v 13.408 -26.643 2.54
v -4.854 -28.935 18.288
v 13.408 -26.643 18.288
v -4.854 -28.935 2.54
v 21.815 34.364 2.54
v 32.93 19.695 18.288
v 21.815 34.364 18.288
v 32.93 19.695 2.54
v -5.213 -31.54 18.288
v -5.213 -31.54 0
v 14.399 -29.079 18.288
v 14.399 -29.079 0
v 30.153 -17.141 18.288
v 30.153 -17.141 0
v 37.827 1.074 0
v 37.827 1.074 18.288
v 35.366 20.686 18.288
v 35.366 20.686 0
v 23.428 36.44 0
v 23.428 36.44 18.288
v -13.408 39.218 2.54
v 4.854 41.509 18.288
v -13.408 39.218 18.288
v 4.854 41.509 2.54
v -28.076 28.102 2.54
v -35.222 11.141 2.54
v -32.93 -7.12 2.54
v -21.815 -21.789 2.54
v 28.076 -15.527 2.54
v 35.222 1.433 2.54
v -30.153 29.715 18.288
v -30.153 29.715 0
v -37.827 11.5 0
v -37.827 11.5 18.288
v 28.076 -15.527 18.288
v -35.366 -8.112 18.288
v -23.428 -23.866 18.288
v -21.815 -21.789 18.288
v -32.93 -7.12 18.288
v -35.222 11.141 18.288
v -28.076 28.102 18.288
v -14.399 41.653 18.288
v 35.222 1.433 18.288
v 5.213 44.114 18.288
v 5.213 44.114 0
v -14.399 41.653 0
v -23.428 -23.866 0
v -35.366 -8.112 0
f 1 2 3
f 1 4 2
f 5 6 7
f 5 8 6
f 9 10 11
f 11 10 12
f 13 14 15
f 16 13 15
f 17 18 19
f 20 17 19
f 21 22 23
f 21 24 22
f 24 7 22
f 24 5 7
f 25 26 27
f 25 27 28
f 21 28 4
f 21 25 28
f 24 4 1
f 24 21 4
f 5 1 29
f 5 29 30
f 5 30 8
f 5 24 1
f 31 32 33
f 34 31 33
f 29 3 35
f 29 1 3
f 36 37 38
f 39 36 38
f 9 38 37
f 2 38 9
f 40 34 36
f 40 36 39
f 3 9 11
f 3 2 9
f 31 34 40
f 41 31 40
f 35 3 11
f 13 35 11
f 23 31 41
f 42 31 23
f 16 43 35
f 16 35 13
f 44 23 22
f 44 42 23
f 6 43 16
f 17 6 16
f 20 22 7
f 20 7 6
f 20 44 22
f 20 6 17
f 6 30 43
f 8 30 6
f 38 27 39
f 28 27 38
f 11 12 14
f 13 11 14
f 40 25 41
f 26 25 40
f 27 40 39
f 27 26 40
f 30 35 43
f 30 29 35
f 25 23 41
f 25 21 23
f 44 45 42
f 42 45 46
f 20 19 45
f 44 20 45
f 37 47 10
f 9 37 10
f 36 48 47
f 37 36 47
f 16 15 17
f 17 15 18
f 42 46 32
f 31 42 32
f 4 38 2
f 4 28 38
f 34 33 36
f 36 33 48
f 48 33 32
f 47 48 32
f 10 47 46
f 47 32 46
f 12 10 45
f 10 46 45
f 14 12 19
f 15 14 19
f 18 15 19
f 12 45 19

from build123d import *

# Parameters (mm, degrees)
F1_DEPTH = 18.288
F2_T     = -177.8
F3_T     = -2.54


with BuildPart() as f1:
    # F0 (on Top) → F1 (new body)
    with BuildSketch(Plane.XY):
        Polygon((5.212843, 44.114474), (-14.399178, 41.653003), (-30.152951, 29.715296), (-37.827265, 11.500053), (-35.365794, -8.111968), (-23.428087, -23.865741), (-5.212843, -31.540055), (14.399178, -29.078584), (30.152951, -17.140877), (37.827265, 1.074367), (35.365794, 20.686388), (23.428087, 36.44016), align=None)
    extrude(amount=F1_DEPTH)

    # F2
    f2_openings = [f1.faces().sort_by_distance(p)[0] for p in [
        (0, 6.28721, 18.288),
    ]]
    offset(amount=F2_T, openings=f2_openings)

    # F3
    f3_openings = [f1.faces().sort_by_distance(p)[0] for p in [
        (0, 6.28721, 18.288),
    ]]
    offset(amount=F3_T, openings=f3_openings)


solid = f1.part
